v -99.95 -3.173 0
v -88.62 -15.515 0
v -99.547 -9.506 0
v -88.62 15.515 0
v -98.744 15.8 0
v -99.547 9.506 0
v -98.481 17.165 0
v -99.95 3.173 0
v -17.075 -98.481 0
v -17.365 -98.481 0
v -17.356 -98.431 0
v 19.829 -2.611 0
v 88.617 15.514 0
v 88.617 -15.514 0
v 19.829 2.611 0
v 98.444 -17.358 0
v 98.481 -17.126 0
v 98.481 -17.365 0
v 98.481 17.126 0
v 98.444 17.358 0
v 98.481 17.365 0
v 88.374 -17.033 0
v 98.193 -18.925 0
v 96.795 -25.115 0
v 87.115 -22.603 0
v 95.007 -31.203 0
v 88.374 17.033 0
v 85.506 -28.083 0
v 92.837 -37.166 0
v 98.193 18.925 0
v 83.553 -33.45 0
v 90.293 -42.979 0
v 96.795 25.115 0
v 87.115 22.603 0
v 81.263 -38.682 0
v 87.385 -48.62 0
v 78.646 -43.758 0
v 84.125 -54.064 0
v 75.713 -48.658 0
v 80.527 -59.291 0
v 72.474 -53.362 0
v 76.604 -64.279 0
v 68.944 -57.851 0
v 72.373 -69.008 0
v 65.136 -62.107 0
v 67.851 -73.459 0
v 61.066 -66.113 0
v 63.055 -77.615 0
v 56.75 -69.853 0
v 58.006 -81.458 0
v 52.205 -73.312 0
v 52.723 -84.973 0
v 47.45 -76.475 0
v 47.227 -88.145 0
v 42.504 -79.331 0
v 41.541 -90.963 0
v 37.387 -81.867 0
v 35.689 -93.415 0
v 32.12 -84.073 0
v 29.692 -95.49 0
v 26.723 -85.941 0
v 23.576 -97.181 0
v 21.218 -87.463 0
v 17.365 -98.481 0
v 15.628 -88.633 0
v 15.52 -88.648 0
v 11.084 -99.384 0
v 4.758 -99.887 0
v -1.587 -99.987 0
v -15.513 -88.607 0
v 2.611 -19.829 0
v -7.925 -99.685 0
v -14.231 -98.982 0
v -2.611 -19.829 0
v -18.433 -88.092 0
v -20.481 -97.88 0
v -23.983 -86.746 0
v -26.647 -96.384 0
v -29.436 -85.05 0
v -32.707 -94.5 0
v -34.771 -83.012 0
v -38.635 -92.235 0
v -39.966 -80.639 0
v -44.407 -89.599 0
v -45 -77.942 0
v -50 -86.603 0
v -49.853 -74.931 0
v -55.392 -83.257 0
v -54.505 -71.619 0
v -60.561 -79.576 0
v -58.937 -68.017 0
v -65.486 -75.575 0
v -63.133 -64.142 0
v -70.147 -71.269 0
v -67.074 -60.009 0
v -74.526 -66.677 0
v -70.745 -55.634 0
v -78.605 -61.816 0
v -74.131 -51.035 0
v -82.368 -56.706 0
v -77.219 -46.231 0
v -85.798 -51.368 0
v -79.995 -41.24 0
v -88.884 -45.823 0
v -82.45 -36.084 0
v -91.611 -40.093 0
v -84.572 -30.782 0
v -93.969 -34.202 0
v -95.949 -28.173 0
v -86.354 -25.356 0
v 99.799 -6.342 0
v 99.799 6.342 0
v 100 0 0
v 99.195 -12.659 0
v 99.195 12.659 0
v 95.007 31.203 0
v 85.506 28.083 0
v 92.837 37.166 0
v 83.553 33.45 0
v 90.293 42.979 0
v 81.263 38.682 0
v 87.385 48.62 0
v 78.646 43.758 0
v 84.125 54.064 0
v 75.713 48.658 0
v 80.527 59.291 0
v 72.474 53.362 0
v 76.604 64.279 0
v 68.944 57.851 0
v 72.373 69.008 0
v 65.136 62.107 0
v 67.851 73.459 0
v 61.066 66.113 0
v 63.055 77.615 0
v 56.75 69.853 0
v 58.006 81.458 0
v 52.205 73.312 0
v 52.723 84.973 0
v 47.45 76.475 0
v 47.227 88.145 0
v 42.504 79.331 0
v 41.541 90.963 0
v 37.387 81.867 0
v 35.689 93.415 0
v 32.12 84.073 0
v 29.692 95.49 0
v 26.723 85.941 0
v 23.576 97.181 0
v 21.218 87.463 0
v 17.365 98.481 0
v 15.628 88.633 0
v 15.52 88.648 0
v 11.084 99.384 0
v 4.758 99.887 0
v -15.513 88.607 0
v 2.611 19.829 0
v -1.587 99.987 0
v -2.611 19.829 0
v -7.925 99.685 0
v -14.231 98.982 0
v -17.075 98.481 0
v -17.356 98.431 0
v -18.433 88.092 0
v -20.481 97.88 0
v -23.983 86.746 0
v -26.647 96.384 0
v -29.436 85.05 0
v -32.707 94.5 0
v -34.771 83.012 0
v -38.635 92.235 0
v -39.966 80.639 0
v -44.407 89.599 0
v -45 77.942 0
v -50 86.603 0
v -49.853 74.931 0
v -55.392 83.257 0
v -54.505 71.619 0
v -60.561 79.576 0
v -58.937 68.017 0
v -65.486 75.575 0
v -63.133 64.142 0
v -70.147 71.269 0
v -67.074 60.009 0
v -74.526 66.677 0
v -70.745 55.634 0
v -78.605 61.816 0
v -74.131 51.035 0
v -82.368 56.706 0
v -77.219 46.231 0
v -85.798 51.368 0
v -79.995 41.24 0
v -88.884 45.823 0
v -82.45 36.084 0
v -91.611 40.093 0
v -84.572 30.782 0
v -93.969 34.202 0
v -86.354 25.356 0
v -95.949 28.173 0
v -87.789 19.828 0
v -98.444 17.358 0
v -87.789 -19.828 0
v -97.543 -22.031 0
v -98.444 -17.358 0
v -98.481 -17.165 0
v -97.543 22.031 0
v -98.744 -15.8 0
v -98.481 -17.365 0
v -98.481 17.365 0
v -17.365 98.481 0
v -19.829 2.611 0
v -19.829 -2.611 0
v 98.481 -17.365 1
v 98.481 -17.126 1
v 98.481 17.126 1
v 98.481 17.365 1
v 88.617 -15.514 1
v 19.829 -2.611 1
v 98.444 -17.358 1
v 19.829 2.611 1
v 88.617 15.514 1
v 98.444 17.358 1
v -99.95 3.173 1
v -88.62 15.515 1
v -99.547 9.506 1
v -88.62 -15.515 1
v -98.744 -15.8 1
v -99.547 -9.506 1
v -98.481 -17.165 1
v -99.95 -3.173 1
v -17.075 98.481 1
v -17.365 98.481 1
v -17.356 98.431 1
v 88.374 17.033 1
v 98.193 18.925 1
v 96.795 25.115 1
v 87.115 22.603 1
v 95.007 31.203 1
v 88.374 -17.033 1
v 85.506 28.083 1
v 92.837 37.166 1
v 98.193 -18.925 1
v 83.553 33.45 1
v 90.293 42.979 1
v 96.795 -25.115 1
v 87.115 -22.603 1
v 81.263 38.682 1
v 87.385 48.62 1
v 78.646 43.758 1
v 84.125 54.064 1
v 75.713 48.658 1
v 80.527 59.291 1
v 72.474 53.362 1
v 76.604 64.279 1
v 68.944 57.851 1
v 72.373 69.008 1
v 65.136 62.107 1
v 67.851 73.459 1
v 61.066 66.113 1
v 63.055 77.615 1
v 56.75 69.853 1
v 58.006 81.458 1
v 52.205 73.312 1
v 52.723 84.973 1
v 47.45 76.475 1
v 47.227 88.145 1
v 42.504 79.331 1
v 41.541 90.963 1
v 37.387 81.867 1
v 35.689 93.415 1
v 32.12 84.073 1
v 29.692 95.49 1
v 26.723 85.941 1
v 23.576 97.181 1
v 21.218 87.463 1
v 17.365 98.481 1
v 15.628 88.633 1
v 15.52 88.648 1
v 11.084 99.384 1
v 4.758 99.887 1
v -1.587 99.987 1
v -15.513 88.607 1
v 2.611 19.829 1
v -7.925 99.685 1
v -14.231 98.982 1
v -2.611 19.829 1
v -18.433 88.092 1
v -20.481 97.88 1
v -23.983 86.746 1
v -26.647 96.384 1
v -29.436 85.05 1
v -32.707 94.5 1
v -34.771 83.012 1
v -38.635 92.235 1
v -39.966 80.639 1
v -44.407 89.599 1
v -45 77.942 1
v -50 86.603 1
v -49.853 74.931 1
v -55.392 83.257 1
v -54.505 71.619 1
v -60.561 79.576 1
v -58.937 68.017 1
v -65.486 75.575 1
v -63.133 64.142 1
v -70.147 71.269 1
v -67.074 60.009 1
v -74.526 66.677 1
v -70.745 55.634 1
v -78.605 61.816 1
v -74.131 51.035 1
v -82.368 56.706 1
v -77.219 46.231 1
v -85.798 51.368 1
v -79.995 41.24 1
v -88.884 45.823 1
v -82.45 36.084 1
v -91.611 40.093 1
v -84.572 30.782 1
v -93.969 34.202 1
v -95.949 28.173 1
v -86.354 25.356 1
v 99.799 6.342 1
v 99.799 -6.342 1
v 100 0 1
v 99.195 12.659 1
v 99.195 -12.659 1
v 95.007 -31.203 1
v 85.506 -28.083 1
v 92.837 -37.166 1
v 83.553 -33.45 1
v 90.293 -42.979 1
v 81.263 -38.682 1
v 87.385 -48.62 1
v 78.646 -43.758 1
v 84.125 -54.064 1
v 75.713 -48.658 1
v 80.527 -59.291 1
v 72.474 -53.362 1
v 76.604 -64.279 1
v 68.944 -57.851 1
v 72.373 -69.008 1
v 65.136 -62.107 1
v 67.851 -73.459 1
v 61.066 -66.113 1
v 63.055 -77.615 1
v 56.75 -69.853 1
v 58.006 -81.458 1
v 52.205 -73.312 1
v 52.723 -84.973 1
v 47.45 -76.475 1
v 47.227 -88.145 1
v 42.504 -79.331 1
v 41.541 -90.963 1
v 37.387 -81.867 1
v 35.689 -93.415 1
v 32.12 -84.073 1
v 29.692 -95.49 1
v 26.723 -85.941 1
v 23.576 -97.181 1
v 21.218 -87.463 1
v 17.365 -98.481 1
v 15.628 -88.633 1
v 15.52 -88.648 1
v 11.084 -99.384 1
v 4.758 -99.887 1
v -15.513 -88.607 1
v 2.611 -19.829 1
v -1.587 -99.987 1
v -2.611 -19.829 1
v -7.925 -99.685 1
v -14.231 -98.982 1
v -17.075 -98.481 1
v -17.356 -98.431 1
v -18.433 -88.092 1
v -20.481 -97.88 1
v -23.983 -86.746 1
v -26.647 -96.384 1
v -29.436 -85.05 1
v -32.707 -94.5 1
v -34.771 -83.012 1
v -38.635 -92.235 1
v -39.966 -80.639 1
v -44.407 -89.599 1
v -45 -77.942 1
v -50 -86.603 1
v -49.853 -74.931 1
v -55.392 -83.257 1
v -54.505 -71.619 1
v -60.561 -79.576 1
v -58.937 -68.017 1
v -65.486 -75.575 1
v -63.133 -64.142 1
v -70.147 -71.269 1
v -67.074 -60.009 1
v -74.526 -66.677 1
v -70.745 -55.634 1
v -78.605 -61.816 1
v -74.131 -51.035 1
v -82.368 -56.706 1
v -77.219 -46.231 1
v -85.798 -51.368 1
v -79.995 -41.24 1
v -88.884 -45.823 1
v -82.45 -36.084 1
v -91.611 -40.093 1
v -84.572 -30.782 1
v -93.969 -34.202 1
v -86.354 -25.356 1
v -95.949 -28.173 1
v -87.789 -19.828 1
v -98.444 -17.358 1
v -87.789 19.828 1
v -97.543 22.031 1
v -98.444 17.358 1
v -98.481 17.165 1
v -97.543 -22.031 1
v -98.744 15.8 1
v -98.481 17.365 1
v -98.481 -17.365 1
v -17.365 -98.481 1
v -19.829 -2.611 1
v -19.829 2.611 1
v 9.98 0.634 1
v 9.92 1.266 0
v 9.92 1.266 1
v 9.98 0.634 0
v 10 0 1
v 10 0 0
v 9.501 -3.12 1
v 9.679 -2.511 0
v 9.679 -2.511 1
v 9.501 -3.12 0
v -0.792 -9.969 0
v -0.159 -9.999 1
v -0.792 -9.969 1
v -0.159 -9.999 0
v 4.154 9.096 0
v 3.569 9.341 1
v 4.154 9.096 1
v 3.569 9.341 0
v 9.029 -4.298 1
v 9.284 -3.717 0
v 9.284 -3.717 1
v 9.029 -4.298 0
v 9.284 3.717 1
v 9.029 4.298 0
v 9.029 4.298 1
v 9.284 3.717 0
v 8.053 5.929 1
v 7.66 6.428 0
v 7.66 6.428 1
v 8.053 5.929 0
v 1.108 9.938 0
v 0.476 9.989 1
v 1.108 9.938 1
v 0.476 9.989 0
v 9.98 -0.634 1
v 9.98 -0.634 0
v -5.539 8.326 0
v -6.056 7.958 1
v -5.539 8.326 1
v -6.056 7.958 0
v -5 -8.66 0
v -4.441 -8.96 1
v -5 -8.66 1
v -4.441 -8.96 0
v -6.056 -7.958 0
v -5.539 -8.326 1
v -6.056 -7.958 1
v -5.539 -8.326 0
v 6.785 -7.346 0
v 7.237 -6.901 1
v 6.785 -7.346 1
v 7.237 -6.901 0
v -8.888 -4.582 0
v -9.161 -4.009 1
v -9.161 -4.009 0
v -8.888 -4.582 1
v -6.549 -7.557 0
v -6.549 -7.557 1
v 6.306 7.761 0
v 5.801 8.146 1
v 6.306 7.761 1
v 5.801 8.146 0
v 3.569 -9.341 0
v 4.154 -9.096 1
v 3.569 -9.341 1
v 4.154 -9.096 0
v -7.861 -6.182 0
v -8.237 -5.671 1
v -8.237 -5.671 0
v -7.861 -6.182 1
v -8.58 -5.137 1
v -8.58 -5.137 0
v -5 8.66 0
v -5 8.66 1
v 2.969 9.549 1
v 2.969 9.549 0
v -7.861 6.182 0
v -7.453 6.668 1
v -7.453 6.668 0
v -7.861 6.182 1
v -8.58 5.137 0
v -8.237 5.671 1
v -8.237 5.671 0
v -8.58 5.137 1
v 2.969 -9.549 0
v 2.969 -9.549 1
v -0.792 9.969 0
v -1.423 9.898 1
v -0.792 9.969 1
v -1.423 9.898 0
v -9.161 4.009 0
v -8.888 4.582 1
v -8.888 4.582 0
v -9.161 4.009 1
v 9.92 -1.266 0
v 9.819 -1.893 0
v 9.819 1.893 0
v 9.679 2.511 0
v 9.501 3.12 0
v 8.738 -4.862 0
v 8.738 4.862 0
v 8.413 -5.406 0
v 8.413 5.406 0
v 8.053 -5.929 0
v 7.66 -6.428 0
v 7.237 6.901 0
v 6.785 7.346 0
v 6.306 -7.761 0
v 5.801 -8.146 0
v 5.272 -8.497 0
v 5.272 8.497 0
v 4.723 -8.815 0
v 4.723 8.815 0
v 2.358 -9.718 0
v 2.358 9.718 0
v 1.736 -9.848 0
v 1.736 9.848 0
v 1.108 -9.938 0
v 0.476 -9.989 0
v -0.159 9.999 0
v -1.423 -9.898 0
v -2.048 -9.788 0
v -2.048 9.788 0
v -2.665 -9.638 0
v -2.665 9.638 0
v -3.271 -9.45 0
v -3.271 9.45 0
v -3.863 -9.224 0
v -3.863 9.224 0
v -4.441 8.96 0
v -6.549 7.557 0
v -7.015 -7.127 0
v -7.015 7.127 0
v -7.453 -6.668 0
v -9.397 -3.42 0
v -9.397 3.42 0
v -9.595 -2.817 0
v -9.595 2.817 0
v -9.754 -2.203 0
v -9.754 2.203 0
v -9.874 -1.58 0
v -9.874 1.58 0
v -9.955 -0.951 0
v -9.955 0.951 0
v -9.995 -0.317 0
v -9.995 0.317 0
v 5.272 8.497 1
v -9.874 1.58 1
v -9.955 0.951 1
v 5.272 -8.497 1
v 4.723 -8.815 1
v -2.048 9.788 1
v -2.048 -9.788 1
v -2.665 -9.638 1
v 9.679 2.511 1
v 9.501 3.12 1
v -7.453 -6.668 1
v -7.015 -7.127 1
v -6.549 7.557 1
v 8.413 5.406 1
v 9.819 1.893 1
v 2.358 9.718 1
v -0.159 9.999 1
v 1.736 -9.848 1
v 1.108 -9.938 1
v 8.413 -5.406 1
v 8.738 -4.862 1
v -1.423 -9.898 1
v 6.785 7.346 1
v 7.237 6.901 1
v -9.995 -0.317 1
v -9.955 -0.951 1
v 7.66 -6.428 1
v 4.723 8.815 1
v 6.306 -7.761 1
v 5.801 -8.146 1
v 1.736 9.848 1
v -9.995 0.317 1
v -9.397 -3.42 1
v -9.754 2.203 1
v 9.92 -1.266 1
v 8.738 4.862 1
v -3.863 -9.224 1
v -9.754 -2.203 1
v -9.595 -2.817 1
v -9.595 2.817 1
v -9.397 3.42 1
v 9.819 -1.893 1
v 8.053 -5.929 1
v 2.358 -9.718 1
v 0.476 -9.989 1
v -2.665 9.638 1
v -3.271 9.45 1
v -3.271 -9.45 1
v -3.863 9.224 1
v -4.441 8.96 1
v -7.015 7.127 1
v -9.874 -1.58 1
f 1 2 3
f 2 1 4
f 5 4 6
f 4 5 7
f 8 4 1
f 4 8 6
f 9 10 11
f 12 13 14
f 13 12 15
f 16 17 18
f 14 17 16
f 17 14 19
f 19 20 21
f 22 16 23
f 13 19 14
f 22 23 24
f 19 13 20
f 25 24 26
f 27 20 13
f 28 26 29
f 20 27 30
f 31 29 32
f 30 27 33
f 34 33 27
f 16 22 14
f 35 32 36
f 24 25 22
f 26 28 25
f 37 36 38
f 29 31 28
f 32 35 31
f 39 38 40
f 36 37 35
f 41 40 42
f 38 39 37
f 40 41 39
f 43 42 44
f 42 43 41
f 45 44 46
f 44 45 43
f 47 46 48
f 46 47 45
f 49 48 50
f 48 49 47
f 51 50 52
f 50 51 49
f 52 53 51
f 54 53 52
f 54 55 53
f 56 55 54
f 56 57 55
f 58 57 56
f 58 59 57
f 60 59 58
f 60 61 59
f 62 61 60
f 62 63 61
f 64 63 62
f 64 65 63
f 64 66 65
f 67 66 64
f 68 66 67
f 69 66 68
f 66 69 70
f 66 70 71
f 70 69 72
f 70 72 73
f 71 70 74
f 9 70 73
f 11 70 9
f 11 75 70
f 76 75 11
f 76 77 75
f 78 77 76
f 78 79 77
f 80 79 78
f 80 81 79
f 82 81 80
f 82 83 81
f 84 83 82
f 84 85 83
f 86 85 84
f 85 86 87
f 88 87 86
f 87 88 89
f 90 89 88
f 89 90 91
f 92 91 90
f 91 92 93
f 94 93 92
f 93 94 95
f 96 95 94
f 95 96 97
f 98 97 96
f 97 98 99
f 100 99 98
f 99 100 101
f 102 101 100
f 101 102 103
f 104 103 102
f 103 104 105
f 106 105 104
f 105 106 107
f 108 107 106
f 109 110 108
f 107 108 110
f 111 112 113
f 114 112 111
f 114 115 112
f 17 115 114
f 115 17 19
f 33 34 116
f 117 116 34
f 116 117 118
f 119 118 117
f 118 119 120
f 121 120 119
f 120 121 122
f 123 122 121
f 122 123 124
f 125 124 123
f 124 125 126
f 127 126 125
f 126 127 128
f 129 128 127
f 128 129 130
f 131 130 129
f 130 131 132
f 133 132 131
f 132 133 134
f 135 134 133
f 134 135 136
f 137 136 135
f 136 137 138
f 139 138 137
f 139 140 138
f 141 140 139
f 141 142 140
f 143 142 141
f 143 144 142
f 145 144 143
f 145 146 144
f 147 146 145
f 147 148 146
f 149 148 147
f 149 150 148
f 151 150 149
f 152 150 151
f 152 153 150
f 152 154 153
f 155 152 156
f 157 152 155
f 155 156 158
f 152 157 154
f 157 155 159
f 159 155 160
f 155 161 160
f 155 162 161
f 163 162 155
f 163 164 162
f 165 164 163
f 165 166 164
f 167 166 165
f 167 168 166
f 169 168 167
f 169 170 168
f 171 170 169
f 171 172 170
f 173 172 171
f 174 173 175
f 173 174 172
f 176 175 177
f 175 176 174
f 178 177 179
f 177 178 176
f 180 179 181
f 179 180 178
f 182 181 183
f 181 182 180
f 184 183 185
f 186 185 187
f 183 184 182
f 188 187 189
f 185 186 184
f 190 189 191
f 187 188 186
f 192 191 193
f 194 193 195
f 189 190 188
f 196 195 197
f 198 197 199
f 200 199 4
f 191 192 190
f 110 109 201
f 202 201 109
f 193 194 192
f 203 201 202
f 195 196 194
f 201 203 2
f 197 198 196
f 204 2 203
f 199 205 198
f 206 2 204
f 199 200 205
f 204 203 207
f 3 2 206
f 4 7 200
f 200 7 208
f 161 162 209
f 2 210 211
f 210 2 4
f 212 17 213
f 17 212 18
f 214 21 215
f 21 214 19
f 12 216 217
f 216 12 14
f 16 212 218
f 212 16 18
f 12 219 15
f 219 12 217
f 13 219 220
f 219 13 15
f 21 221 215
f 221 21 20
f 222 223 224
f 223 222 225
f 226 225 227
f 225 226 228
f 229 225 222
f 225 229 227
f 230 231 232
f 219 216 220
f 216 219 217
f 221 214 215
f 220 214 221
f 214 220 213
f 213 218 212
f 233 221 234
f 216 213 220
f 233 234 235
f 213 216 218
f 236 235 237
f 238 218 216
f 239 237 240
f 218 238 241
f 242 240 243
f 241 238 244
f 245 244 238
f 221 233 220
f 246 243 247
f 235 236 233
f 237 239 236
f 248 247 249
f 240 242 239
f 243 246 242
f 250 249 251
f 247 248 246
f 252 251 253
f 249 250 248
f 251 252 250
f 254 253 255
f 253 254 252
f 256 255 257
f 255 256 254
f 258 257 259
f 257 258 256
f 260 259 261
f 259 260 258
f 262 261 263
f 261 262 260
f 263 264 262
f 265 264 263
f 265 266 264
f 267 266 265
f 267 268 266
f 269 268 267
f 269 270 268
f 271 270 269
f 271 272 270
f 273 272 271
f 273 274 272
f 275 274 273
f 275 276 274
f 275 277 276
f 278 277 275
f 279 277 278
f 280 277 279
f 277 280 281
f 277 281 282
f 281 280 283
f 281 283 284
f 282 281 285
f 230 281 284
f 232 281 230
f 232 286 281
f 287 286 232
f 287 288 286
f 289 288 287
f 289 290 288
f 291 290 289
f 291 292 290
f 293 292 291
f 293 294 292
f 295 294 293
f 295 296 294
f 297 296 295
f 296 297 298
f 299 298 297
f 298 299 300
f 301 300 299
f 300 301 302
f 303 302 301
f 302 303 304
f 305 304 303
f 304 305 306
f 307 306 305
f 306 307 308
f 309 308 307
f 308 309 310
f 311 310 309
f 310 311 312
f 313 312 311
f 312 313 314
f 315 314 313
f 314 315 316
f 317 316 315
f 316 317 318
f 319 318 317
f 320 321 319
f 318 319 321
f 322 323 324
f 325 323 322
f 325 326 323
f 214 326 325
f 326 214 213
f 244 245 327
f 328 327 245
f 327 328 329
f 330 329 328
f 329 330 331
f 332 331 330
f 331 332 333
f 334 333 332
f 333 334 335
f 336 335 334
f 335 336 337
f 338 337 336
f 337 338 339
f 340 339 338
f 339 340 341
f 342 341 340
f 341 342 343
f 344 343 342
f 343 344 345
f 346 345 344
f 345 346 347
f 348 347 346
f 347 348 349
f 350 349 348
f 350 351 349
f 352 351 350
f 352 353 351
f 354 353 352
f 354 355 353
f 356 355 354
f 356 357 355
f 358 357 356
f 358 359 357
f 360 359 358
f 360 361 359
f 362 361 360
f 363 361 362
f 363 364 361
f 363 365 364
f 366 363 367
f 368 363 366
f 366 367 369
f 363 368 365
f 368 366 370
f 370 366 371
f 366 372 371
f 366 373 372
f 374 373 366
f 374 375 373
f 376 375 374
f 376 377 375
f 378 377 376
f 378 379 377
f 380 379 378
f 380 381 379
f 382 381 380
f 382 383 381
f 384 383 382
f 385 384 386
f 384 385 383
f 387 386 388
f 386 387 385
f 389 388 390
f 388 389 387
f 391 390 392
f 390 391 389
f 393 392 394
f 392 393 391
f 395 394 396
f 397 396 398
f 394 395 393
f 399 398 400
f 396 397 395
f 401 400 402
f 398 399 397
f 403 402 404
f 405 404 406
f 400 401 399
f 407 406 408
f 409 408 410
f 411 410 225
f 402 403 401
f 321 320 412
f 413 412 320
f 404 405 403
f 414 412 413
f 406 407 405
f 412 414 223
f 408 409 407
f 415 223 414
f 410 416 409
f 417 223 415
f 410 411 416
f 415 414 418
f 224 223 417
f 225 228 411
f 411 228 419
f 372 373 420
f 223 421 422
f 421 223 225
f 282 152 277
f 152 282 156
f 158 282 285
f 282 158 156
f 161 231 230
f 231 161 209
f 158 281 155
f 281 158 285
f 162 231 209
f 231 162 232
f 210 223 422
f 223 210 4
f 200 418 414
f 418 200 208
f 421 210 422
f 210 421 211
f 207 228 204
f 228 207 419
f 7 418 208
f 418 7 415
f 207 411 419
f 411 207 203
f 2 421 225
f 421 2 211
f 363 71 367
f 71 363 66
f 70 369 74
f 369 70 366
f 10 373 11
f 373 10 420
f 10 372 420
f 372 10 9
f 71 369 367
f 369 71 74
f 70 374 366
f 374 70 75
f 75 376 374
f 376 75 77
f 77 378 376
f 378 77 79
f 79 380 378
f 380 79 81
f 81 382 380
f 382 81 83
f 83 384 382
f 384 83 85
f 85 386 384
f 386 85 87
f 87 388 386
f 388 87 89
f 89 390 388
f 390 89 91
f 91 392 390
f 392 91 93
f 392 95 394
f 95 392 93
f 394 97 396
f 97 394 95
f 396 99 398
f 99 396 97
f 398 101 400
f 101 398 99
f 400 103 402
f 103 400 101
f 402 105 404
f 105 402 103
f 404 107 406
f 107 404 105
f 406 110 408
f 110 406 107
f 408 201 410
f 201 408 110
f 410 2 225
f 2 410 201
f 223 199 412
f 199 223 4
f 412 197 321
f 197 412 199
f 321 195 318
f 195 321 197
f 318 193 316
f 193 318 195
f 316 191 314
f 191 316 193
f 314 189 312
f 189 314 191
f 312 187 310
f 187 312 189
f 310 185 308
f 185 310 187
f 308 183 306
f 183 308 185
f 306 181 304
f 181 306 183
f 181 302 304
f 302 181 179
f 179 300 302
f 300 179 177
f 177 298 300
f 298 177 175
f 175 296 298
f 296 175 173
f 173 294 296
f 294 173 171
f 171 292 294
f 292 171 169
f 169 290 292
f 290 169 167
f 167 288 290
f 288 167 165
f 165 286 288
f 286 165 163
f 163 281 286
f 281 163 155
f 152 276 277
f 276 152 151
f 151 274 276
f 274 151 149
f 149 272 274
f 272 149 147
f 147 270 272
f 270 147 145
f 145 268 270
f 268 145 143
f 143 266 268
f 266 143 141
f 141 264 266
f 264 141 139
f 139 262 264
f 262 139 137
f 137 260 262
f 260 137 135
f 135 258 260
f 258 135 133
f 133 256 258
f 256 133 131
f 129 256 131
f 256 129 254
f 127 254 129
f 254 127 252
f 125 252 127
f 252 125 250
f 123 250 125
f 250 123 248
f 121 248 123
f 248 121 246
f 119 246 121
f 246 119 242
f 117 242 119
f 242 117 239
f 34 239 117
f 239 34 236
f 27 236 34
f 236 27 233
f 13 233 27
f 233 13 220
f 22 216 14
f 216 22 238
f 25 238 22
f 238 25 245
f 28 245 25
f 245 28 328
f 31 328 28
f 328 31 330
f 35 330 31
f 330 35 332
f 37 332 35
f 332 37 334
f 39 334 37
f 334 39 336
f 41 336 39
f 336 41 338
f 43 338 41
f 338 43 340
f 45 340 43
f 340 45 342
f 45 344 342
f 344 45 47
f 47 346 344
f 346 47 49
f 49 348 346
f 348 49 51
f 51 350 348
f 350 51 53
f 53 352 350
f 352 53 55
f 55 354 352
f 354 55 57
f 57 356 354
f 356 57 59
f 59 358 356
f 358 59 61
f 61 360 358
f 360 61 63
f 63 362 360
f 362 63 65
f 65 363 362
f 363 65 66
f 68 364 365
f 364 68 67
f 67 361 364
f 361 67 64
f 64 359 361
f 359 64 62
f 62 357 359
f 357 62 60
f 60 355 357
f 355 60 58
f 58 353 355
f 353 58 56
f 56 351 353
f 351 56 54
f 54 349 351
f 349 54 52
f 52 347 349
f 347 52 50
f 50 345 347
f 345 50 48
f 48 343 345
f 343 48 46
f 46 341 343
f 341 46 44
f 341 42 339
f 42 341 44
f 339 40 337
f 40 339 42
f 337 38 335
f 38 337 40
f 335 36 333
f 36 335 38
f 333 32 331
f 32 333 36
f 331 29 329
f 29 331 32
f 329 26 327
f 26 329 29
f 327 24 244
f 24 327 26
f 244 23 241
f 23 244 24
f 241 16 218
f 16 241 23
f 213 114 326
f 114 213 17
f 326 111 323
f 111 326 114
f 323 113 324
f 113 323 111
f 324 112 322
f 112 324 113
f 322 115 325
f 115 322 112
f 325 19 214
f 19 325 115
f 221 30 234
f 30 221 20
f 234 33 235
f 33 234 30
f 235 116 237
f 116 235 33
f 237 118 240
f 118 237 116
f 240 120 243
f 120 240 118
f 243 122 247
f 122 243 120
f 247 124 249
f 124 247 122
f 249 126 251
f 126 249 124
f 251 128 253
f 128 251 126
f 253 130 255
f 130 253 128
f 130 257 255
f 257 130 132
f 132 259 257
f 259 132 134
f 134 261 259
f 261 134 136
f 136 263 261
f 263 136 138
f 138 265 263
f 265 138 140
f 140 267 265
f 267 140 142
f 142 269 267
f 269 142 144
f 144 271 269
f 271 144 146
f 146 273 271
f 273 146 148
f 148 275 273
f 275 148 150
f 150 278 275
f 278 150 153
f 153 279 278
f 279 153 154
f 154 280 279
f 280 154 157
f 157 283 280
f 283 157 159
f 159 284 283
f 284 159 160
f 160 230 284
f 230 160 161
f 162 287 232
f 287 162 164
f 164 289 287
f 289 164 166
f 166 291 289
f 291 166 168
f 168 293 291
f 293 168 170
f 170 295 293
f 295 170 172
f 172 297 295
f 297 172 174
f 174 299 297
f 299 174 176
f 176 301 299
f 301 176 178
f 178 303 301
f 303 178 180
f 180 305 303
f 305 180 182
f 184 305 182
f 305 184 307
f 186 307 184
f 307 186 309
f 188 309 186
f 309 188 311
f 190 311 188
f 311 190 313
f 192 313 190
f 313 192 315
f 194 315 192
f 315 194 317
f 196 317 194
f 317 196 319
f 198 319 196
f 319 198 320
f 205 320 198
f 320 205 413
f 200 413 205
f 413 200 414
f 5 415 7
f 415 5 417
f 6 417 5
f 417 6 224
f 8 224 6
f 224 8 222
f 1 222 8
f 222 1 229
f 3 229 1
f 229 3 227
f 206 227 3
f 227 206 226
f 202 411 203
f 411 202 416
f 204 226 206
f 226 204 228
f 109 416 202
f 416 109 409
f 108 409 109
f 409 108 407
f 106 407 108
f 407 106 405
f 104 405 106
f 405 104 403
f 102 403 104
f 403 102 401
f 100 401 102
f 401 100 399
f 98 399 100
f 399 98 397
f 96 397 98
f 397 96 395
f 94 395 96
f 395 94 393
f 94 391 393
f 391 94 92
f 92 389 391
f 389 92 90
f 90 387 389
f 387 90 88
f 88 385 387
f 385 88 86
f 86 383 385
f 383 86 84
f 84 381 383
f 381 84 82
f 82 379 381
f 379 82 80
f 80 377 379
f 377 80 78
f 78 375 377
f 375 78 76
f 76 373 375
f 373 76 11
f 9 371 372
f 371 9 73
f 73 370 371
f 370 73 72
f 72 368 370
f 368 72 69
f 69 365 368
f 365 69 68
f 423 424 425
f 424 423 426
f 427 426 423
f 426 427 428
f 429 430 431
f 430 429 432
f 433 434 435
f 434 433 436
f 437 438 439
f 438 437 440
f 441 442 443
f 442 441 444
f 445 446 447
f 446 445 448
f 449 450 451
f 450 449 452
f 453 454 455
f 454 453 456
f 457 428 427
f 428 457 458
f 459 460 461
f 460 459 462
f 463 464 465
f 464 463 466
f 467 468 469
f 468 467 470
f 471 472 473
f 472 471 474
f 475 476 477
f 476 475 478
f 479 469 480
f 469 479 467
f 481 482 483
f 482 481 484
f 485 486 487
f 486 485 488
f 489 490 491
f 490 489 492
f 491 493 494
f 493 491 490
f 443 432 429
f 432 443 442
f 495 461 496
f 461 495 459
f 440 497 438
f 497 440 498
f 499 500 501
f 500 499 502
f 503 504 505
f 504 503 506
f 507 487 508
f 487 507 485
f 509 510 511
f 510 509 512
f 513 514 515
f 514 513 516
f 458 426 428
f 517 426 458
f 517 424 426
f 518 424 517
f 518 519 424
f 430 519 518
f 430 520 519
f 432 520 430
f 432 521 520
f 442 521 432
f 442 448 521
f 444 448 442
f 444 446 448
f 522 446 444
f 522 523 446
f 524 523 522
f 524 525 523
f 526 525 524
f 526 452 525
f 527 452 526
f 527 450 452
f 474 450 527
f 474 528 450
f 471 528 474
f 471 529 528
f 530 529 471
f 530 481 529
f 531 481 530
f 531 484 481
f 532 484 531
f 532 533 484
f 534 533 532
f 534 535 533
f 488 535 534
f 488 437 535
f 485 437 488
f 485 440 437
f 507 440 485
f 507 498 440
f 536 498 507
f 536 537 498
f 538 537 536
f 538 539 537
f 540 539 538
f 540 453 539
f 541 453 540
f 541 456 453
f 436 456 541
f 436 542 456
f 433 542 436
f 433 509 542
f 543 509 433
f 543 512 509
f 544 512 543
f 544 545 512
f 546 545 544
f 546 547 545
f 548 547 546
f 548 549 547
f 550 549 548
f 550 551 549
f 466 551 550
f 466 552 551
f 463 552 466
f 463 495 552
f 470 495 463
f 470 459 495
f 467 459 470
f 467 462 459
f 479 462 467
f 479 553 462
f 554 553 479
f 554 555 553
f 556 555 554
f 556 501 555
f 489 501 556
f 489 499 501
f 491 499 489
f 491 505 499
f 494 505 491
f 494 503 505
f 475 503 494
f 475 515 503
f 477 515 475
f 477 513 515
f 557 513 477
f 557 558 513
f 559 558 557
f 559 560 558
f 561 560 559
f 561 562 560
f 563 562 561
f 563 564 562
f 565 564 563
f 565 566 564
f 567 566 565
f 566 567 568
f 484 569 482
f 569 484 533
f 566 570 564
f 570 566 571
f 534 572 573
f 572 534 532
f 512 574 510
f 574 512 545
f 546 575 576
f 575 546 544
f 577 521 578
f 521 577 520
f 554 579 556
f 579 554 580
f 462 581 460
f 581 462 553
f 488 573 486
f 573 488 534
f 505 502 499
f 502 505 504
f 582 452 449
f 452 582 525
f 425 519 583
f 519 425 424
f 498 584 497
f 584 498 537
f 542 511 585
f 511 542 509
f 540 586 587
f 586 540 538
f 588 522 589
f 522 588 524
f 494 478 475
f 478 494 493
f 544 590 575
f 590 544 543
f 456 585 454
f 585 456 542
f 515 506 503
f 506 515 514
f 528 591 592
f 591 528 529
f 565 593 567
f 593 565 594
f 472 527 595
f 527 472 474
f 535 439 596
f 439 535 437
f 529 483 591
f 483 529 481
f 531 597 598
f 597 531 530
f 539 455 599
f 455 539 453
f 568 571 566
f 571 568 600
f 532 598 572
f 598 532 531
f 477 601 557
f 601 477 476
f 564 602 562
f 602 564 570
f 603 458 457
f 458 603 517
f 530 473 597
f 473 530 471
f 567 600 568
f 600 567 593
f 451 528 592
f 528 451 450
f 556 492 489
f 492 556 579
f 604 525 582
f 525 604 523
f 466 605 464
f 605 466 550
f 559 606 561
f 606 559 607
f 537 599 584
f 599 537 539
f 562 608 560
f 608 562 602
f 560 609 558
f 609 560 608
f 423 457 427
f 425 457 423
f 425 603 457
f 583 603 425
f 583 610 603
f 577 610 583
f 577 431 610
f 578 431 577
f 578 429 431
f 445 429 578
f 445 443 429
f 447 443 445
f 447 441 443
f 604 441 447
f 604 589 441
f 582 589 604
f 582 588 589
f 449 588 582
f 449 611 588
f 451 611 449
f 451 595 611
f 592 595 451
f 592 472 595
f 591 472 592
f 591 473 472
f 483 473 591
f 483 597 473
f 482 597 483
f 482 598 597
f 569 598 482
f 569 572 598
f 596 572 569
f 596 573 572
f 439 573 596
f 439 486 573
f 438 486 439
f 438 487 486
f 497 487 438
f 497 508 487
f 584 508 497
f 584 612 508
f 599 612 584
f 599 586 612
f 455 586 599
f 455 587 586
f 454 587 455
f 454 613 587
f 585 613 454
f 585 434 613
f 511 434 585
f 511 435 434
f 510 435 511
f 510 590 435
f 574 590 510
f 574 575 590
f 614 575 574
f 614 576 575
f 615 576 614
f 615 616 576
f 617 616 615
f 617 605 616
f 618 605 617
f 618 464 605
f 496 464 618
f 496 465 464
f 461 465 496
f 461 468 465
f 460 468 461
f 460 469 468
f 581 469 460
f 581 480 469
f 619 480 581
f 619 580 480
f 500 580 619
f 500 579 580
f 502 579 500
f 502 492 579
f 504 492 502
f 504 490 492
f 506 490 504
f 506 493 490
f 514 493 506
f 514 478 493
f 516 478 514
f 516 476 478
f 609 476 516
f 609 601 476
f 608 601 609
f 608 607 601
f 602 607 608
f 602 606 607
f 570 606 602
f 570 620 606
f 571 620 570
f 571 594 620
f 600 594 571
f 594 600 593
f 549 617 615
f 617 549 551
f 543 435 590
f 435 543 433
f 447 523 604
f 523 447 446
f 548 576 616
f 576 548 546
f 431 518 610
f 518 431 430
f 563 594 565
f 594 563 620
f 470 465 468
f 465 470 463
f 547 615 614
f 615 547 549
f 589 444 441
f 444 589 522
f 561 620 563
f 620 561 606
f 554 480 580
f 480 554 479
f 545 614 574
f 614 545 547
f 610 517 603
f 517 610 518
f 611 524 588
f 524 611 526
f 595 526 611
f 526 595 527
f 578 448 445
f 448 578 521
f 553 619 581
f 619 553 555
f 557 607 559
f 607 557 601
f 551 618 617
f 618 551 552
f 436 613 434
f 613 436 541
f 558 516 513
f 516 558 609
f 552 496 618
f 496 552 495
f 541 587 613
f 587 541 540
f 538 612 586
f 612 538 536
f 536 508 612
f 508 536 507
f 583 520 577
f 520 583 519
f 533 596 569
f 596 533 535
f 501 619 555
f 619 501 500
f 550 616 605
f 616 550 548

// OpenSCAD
// fan_blades.scad
//
// Fan blades, just like it says.
//
// TODO:
//	Blade decoration
//	Optional cut/segmentation
//	Multiple color outer rings

/* [Fan] */

// [Inner radius]
_FanInnerRadius = 20;

// [Outer Radius]
_FanOuterRadius = 100;

// [Blades]
_FanBladeCount = 4;

// [Blade Thickness]
_FanBladeThickness = 1.0;

// [Inner Angle]
_FanInnerAngle = 15.0;

// [Outer Angle]
_FanOuterAngle = 20.0;

/* [Inner Circle, Ouuter Ring] */

// [Inner Circle]
_FanInnerCircle = true;

// [Outer Ring]
_FanOuterRing = true;

// [Inner Circle Radius]
_FanInnerCircleRadius = 10;

// [Outer Ring Inner Radius]
_FanOuterRingInnerRadius = 90;

// [Outer Ring Outer Radius]
_FanOuterRingOuterRadius = 100;

/* [Extruders] */

// [Extruder Count]
_FanExtruderCount = 5;

// [Inner Circle Extruder]
_FanInnerCircleExtruder = 1;

// [Outer Ring Extruders]

// [Extruder 1]
_FanOuterRingExtruder1 = true;

// [Extruder 2]
_FanOuterRingExtruder2 = true;

// [Extruder 3]
_FanOuterRingExtruder3 = true;

// [Extruder 4]
_FanOuterRingExtruder4 = true;

// [Extruder 5]
_FanOuterRingExtruder5 = true;

// [Extruder to render]
_WhichExtruder = "All"; // ["All", 1, 2, 3, 4, 5]

// Map a value of Extruder to an OpenSCAD color
function ExtruderColor(Extruder) = 
  (Extruder == 1  ) ? "red"    : 
  (Extruder == 2  ) ? "green"  : 
  (Extruder == 3  ) ? "blue"   : 
  (Extruder == 4  ) ? "pink"   :
  (Extruder == 5  ) ? "yellow" :
                      "purple" ;
					  
// If _WhichExtruder is "All" or is not "All" and matches the requested extruder, render 
// the child nodes.

module Extruder(DoExtruder)
{
	color(ExtruderColor(DoExtruder))
	{
		if (_WhichExtruder == "All" || DoExtruder == _WhichExtruder)
		{
			children();
		}
	}
}

module RenderBlade(Theta, InnerRadius, OuterRadius, BladeThickness, InnerAngle, OuterAngle, Extruder)
{
	// Compute points
	X0 = InnerRadius * cos(Theta - InnerAngle / 2);
	Y0 = InnerRadius * sin(Theta - InnerAngle / 2);
	X1 = InnerRadius * cos(Theta + InnerAngle / 2);
	Y1 = InnerRadius * sin(Theta + InnerAngle / 2);

	X2 = OuterRadius * cos(Theta + OuterAngle / 2);
	Y2 = OuterRadius * sin(Theta + OuterAngle / 2);
	X3 = OuterRadius * cos(Theta - OuterAngle / 2);
	Y3 = OuterRadius * sin(Theta - OuterAngle / 2);

	BladePoly =
	[
		[X0, Y0], [X1, Y1],	[X2, Y2], [X3, Y3]
	];
	
	Extruder(Extruder)
	{
		linear_extrude(BladeThickness)
		{
			polygon(BladePoly);
		}
	}
}

module RenderFan(FanInnerRadius, FanOuterRadius, FanBladeCount, FanBladeThickness, FanInnerAngle, FanOuterAngle, FanExtruderCount, FanInnerCircle, FanInnerCircleRadius, FanInnerCircleExtruder, FanOuterRing, FanOuterRingInnerRadius, FanOuterRingOuterRadius, FanOuterRingExtruders)
{
	// Render each blade
	for (Blade = [0 : FanBladeCount - 1])
	{
		Theta = Blade * (360 / FanBladeCount);
		RenderBlade(Theta, FanInnerRadius, FanOuterRadius, FanBladeThickness, FanInnerAngle, FanOuterAngle, 1 + (Blade % FanExtruderCount));
	}
	
	// Render inner circle
	if (FanInnerCircle)
	{
		Extruder(FanInnerCircleExtruder)
		{
			linear_extrude(FanBladeThickness)
			{
				circle(FanInnerCircleRadius, $fn=99);
			}
		}
	}
	
	// Render outer ring using 1 or more extruders
	if (FanOuterRing)
	{
        RadiusStep = (FanOuterRingOuterRadius - FanOuterRingInnerRadius) / len(FanOuterRingExtruders);
        echo(RadiusStep);
        
        for (Ex = [0 : len(FanOuterRingExtruders) - 1])
        {
            echo("Extruder: ", FanOuterRingExtruders[Ex]);
            Extruder(FanOuterRingExtruders[Ex])
            {
                linear_extrude(FanBladeThickness)
                {
                    difference()
                    {
                        circle(FanOuterRingInnerRadius + ((Ex + 1) * RadiusStep), $fn=99);
                        circle(FanOuterRingInnerRadius + (Ex * RadiusStep), $fn=99);
                    }
                }
            }
        }
	}
}

module main(FanInnerRadius, FanOuterRadius, FanBladeCount, FanBladeThickness, FanInnerAngle, FanOuterAngle, FanExtruderCount, FanInnerCircle, FanInnerCircleRadius, FanInnerCircleExtruder, FanOuterRing, FanOuterRingInnerRadius, FanOuterRingOuterRadius, FanOuterRingExtruder1, FanOuterRingExtruder2, FanOuterRingExtruder3, FanOuterRingExtruder4, FanOuterRingExtruder5)
{
    AllFanOuterRingExtruders = 
    [
        _FanOuterRingExtruder1 ? 1 : 0, 
        _FanOuterRingExtruder2 ? 2 : 0,
        _FanOuterRingExtruder3 ? 3 : 0,
        _FanOuterRingExtruder4 ? 4 : 0, 
        _FanOuterRingExtruder5 ? 5 : 0
    ];
    
    FanOuterRingExtruders = [for (E = AllFanOuterRingExtruders) if (E != 0) E];
    
	RenderFan(FanInnerRadius, FanOuterRadius, FanBladeCount, FanBladeThickness, FanInnerAngle, FanOuterAngle, FanExtruderCount, FanInnerCircle, FanInnerCircleRadius, FanInnerCircleExtruder, FanOuterRing, FanOuterRingInnerRadius, FanOuterRingOuterRadius, FanOuterRingExtruders);
}

main(_FanInnerRadius, _FanOuterRadius, _FanBladeCount, _FanBladeThickness, _FanInnerAngle, _FanOuterAngle, _FanExtruderCount, _FanInnerCircle, _FanInnerCircleRadius, _FanInnerCircleExtruder, _FanOuterRing, _FanOuterRingInnerRadius, _FanOuterRingOuterRadius, _FanOuterRingExtruder1, _FanOuterRingExtruder2, _FanOuterRingExtruder3, _FanOuterRingExtruder4, _FanOuterRingExtruder5);
